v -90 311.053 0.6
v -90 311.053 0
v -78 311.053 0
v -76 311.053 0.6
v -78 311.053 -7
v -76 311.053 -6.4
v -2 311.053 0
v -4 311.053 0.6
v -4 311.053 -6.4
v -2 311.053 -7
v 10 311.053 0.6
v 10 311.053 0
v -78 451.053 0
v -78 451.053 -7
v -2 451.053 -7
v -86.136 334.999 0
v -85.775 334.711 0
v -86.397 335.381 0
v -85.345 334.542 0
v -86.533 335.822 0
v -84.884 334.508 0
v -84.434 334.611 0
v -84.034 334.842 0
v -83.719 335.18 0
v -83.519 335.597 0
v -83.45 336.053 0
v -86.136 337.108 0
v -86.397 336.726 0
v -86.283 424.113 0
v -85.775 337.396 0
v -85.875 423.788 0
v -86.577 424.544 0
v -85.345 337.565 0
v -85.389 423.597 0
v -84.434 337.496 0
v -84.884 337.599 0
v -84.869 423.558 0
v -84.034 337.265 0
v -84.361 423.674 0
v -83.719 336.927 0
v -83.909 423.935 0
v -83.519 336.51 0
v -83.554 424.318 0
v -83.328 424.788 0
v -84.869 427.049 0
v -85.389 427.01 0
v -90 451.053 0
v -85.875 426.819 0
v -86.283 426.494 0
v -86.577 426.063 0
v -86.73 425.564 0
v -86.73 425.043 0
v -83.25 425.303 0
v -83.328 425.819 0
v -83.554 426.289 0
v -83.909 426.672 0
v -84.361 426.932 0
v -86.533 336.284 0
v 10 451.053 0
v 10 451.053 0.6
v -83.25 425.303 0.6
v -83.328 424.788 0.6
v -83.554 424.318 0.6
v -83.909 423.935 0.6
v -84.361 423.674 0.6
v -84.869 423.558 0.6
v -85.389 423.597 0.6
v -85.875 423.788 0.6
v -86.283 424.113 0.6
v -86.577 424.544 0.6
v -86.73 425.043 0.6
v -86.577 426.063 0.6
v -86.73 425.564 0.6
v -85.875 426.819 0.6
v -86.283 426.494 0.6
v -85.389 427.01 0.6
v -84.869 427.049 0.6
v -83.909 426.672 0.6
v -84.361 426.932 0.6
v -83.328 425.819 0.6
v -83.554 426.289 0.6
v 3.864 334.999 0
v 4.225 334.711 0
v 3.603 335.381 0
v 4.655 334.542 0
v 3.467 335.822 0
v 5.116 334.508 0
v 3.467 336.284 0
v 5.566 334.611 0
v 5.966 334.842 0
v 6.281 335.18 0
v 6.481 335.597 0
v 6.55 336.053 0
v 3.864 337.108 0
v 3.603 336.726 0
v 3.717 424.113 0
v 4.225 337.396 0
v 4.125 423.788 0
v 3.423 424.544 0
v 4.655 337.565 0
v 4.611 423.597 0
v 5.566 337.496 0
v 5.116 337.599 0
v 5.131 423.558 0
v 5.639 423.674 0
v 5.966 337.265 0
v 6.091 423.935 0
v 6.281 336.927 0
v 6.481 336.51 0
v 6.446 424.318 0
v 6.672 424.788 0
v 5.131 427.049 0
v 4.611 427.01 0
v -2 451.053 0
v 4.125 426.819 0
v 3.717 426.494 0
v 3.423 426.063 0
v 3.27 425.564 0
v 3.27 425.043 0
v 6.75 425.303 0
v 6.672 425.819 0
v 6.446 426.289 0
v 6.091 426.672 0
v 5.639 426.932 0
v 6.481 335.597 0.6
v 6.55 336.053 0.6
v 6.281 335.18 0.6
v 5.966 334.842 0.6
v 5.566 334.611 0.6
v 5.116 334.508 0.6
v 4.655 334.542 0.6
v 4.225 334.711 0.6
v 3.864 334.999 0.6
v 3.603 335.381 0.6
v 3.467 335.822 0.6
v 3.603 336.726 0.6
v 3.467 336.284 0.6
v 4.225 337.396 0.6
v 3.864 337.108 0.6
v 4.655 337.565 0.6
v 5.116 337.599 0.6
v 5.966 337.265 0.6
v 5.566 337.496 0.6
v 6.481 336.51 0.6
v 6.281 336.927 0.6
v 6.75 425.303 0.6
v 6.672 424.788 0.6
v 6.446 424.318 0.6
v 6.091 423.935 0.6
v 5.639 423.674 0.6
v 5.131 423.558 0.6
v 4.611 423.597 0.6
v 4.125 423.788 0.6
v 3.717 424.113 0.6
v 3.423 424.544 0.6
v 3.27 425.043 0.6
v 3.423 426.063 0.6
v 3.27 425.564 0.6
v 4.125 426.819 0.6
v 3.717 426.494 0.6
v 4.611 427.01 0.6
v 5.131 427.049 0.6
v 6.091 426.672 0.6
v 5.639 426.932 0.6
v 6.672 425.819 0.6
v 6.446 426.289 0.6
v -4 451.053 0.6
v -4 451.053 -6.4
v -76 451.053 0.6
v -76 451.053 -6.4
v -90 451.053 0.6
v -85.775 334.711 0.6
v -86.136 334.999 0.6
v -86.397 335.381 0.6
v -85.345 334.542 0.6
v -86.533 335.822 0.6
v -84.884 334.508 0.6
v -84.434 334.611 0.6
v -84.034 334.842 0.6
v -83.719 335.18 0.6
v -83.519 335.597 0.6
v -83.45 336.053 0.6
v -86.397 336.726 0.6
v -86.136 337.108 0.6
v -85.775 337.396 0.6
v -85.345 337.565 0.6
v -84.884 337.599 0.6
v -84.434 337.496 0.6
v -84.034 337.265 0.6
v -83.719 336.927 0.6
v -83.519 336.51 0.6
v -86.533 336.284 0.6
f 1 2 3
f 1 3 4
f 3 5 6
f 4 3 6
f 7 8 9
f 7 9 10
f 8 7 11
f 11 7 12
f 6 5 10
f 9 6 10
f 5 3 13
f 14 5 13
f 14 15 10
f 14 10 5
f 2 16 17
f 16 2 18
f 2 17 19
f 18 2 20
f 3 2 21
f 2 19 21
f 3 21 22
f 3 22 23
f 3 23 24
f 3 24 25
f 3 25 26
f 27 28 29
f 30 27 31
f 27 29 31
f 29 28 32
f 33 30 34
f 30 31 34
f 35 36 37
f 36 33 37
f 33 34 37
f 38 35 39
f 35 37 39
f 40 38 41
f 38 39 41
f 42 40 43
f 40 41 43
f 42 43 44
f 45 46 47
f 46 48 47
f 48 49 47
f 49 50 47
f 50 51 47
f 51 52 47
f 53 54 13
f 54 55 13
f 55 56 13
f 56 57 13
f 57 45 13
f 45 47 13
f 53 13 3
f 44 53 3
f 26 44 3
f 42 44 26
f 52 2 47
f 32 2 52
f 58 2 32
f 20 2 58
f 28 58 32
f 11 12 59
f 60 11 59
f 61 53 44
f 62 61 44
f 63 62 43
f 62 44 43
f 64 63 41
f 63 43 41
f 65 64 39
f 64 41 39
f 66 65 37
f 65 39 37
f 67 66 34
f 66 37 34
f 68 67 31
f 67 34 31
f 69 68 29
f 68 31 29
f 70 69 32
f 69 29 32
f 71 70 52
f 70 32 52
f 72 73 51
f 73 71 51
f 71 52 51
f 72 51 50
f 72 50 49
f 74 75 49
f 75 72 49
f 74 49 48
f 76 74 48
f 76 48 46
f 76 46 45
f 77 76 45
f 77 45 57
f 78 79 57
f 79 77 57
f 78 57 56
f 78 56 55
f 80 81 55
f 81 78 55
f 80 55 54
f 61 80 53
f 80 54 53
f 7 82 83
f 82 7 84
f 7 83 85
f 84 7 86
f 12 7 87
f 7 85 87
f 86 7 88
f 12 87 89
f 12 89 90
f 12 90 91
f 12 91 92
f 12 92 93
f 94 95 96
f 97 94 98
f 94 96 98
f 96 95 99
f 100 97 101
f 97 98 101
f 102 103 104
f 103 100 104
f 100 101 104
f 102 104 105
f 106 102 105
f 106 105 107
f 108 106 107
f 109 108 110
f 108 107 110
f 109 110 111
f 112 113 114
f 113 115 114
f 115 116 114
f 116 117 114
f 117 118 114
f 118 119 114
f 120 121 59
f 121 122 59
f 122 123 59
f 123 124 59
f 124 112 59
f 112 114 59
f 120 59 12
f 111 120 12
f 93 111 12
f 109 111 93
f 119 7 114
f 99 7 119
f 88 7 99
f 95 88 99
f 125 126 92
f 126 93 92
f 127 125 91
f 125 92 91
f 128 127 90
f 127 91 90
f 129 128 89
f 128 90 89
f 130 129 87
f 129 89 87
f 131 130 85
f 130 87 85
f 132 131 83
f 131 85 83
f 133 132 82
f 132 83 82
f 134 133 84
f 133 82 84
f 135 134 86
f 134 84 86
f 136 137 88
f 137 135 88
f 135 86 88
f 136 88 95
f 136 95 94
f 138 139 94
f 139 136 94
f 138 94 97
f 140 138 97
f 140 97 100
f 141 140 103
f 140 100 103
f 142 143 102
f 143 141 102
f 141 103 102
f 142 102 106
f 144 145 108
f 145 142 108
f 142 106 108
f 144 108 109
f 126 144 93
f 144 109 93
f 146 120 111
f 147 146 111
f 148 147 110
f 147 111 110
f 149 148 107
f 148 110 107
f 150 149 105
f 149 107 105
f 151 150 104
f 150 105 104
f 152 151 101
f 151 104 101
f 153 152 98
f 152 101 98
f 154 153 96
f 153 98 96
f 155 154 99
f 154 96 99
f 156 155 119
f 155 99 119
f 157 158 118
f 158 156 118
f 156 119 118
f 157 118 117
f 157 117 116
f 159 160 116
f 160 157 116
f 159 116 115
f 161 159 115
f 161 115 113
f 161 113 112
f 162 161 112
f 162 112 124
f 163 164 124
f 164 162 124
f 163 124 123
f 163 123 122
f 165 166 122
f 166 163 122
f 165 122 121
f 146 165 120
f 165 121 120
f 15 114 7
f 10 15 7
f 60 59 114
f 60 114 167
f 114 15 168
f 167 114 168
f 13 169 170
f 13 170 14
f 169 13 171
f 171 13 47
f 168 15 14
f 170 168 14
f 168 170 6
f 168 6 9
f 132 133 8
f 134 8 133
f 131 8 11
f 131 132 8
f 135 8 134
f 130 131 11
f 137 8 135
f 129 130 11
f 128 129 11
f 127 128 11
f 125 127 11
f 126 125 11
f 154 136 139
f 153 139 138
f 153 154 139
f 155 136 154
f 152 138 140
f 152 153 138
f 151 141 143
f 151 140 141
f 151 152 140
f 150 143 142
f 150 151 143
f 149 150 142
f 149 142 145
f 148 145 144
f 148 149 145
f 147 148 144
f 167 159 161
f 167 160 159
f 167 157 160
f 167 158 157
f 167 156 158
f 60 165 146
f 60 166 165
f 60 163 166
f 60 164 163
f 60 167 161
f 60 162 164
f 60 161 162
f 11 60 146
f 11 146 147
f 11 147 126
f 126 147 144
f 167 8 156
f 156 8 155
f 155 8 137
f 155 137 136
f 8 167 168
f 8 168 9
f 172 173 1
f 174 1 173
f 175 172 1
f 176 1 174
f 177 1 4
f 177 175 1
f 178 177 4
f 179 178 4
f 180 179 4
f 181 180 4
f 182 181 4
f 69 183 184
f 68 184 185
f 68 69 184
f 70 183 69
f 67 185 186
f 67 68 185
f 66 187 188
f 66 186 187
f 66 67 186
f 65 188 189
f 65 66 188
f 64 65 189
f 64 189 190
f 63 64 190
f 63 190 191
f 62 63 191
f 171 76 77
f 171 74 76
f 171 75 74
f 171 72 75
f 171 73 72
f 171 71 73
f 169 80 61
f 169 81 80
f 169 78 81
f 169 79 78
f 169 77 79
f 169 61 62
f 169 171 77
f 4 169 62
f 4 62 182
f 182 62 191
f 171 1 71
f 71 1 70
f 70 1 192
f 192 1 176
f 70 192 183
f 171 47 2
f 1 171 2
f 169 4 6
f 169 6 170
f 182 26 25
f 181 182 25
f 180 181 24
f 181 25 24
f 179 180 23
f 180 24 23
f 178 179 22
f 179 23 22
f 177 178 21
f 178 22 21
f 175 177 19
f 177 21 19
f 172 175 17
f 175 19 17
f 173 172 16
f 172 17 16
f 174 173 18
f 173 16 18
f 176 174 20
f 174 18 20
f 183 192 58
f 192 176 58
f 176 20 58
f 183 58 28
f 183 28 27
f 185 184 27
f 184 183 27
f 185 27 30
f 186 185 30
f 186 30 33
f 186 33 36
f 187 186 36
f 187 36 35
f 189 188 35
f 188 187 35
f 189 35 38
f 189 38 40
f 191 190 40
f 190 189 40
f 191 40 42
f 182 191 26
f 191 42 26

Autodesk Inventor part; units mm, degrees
ref_plane "YZ Plane" through (0, 0, 0) normal (1, 0, 0) x (0, 1, 0)
ref_plane "XZ Plane" through (0, 0, 0) normal (0, 1, 0) x (-1, 0, 0)
ref_plane "XY Plane" through (0, 0, 0) normal (0, 0, 1) x (1, 0, 0)
sketch "Skizze1" plane through (0, 0, 0) normal (0, 0, 1) x (1, 0, 0)
  line L0 (-90, 421.0534) -> (-90, 451.3884) construction
  line L1 (-90, 311.0534) -> (10, 311.0534)
  line L2 (10, 311.0534) -> (10, 451.0534)
  line L3 (10, 451.0534) -> (-90, 451.0534)
  line L4 (-90, 451.0534) -> (-90, 311.0534)
  circle A0 centre (5, 336.0534) radius 1.55 projected
  circle A1 centre (-85, 425.3034) radius 1.75 projected
  line L5 (10, 304.3034) -> (10, 341.0534) projected
  circle A2 centre (-85, 336.0534) radius 1.55 projected
  circle A3 centre (5, 425.3034) radius 1.75 projected
  line L6 (-90, 304.3034) -> (-90, 341.0534) construction
  point P0 (0, 0)
  dimension "d14" = 25.75
  dimension "d15" = 25
extrude "Extrusion1" add sketch "Skizze1" along normal blind 0.6
sketch "Skizze2" plane through (0, 0, 0) normal (0, 0, -1) x (-1, 0, 0)
  line L0 (90, 311.0534) -> (-10, 311.0534) projected
  line L1 (-10, 451.0534) -> (90, 451.0534) projected
  line L2 (2, 311.0534) -> (78, 311.0534)
  line L3 (78, 311.0534) -> (78, 451.0534)
  line L4 (78, 451.0534) -> (2, 451.0534)
  line L5 (2, 451.0534) -> (2, 311.0534)
  line L6 (-10, 311.0534) -> (-10, 451.0534) projected
  line L7 (90, 451.0534) -> (90, 311.0534) projected
  line L8 (78, 451.0534) -> (2, 451.0534)
  line L9 (2, 451.0534) -> (2, 311.0534)
  line L10 (2, 311.0534) -> (78, 311.0534)
  line L11 (78, 311.0534) -> (78, 451.0534)
  point P0 (0, 0)
  dimension "d4" = 12
  dimension "d5" = 12
extrude "Extrusion3" add sketch "Skizze2" along normal blind 7 contours L0 L5 L1 L3
sketch "Skizze3" plane through (0, 0, 0.6) normal (0, 0, 1) x (1, 0, 0)
  line L0 (-2, 311.0534) -> (-78, 311.0534) construction
  line L1 (-78, 311.0534) -> (-78, 451.0534) construction
  line L2 (-78, 451.0534) -> (-2, 451.0534) construction
  line L3 (-2, 451.0534) -> (-2, 311.0534) construction
  line L4 (-90, 311.0534) -> (10, 311.0534) projected
  line L5 (-78, 451.0534) -> (-2, 451.0534) projected
  line L6 (-4, 311.0534) -> (-76, 311.0534)
  line L7 (-76, 311.0534) -> (-76, 451.0534)
  line L8 (-76, 451.0534) -> (-4, 451.0534)
  line L9 (-4, 451.0534) -> (-4, 311.0534)
  point P0 (0, 0)
  dimension "d10" = 2
  dimension "d11" = 2
extrude "Extrusion4" cut sketch "Skizze3" against normal blind 7
properties part number "PCB-Mount"
